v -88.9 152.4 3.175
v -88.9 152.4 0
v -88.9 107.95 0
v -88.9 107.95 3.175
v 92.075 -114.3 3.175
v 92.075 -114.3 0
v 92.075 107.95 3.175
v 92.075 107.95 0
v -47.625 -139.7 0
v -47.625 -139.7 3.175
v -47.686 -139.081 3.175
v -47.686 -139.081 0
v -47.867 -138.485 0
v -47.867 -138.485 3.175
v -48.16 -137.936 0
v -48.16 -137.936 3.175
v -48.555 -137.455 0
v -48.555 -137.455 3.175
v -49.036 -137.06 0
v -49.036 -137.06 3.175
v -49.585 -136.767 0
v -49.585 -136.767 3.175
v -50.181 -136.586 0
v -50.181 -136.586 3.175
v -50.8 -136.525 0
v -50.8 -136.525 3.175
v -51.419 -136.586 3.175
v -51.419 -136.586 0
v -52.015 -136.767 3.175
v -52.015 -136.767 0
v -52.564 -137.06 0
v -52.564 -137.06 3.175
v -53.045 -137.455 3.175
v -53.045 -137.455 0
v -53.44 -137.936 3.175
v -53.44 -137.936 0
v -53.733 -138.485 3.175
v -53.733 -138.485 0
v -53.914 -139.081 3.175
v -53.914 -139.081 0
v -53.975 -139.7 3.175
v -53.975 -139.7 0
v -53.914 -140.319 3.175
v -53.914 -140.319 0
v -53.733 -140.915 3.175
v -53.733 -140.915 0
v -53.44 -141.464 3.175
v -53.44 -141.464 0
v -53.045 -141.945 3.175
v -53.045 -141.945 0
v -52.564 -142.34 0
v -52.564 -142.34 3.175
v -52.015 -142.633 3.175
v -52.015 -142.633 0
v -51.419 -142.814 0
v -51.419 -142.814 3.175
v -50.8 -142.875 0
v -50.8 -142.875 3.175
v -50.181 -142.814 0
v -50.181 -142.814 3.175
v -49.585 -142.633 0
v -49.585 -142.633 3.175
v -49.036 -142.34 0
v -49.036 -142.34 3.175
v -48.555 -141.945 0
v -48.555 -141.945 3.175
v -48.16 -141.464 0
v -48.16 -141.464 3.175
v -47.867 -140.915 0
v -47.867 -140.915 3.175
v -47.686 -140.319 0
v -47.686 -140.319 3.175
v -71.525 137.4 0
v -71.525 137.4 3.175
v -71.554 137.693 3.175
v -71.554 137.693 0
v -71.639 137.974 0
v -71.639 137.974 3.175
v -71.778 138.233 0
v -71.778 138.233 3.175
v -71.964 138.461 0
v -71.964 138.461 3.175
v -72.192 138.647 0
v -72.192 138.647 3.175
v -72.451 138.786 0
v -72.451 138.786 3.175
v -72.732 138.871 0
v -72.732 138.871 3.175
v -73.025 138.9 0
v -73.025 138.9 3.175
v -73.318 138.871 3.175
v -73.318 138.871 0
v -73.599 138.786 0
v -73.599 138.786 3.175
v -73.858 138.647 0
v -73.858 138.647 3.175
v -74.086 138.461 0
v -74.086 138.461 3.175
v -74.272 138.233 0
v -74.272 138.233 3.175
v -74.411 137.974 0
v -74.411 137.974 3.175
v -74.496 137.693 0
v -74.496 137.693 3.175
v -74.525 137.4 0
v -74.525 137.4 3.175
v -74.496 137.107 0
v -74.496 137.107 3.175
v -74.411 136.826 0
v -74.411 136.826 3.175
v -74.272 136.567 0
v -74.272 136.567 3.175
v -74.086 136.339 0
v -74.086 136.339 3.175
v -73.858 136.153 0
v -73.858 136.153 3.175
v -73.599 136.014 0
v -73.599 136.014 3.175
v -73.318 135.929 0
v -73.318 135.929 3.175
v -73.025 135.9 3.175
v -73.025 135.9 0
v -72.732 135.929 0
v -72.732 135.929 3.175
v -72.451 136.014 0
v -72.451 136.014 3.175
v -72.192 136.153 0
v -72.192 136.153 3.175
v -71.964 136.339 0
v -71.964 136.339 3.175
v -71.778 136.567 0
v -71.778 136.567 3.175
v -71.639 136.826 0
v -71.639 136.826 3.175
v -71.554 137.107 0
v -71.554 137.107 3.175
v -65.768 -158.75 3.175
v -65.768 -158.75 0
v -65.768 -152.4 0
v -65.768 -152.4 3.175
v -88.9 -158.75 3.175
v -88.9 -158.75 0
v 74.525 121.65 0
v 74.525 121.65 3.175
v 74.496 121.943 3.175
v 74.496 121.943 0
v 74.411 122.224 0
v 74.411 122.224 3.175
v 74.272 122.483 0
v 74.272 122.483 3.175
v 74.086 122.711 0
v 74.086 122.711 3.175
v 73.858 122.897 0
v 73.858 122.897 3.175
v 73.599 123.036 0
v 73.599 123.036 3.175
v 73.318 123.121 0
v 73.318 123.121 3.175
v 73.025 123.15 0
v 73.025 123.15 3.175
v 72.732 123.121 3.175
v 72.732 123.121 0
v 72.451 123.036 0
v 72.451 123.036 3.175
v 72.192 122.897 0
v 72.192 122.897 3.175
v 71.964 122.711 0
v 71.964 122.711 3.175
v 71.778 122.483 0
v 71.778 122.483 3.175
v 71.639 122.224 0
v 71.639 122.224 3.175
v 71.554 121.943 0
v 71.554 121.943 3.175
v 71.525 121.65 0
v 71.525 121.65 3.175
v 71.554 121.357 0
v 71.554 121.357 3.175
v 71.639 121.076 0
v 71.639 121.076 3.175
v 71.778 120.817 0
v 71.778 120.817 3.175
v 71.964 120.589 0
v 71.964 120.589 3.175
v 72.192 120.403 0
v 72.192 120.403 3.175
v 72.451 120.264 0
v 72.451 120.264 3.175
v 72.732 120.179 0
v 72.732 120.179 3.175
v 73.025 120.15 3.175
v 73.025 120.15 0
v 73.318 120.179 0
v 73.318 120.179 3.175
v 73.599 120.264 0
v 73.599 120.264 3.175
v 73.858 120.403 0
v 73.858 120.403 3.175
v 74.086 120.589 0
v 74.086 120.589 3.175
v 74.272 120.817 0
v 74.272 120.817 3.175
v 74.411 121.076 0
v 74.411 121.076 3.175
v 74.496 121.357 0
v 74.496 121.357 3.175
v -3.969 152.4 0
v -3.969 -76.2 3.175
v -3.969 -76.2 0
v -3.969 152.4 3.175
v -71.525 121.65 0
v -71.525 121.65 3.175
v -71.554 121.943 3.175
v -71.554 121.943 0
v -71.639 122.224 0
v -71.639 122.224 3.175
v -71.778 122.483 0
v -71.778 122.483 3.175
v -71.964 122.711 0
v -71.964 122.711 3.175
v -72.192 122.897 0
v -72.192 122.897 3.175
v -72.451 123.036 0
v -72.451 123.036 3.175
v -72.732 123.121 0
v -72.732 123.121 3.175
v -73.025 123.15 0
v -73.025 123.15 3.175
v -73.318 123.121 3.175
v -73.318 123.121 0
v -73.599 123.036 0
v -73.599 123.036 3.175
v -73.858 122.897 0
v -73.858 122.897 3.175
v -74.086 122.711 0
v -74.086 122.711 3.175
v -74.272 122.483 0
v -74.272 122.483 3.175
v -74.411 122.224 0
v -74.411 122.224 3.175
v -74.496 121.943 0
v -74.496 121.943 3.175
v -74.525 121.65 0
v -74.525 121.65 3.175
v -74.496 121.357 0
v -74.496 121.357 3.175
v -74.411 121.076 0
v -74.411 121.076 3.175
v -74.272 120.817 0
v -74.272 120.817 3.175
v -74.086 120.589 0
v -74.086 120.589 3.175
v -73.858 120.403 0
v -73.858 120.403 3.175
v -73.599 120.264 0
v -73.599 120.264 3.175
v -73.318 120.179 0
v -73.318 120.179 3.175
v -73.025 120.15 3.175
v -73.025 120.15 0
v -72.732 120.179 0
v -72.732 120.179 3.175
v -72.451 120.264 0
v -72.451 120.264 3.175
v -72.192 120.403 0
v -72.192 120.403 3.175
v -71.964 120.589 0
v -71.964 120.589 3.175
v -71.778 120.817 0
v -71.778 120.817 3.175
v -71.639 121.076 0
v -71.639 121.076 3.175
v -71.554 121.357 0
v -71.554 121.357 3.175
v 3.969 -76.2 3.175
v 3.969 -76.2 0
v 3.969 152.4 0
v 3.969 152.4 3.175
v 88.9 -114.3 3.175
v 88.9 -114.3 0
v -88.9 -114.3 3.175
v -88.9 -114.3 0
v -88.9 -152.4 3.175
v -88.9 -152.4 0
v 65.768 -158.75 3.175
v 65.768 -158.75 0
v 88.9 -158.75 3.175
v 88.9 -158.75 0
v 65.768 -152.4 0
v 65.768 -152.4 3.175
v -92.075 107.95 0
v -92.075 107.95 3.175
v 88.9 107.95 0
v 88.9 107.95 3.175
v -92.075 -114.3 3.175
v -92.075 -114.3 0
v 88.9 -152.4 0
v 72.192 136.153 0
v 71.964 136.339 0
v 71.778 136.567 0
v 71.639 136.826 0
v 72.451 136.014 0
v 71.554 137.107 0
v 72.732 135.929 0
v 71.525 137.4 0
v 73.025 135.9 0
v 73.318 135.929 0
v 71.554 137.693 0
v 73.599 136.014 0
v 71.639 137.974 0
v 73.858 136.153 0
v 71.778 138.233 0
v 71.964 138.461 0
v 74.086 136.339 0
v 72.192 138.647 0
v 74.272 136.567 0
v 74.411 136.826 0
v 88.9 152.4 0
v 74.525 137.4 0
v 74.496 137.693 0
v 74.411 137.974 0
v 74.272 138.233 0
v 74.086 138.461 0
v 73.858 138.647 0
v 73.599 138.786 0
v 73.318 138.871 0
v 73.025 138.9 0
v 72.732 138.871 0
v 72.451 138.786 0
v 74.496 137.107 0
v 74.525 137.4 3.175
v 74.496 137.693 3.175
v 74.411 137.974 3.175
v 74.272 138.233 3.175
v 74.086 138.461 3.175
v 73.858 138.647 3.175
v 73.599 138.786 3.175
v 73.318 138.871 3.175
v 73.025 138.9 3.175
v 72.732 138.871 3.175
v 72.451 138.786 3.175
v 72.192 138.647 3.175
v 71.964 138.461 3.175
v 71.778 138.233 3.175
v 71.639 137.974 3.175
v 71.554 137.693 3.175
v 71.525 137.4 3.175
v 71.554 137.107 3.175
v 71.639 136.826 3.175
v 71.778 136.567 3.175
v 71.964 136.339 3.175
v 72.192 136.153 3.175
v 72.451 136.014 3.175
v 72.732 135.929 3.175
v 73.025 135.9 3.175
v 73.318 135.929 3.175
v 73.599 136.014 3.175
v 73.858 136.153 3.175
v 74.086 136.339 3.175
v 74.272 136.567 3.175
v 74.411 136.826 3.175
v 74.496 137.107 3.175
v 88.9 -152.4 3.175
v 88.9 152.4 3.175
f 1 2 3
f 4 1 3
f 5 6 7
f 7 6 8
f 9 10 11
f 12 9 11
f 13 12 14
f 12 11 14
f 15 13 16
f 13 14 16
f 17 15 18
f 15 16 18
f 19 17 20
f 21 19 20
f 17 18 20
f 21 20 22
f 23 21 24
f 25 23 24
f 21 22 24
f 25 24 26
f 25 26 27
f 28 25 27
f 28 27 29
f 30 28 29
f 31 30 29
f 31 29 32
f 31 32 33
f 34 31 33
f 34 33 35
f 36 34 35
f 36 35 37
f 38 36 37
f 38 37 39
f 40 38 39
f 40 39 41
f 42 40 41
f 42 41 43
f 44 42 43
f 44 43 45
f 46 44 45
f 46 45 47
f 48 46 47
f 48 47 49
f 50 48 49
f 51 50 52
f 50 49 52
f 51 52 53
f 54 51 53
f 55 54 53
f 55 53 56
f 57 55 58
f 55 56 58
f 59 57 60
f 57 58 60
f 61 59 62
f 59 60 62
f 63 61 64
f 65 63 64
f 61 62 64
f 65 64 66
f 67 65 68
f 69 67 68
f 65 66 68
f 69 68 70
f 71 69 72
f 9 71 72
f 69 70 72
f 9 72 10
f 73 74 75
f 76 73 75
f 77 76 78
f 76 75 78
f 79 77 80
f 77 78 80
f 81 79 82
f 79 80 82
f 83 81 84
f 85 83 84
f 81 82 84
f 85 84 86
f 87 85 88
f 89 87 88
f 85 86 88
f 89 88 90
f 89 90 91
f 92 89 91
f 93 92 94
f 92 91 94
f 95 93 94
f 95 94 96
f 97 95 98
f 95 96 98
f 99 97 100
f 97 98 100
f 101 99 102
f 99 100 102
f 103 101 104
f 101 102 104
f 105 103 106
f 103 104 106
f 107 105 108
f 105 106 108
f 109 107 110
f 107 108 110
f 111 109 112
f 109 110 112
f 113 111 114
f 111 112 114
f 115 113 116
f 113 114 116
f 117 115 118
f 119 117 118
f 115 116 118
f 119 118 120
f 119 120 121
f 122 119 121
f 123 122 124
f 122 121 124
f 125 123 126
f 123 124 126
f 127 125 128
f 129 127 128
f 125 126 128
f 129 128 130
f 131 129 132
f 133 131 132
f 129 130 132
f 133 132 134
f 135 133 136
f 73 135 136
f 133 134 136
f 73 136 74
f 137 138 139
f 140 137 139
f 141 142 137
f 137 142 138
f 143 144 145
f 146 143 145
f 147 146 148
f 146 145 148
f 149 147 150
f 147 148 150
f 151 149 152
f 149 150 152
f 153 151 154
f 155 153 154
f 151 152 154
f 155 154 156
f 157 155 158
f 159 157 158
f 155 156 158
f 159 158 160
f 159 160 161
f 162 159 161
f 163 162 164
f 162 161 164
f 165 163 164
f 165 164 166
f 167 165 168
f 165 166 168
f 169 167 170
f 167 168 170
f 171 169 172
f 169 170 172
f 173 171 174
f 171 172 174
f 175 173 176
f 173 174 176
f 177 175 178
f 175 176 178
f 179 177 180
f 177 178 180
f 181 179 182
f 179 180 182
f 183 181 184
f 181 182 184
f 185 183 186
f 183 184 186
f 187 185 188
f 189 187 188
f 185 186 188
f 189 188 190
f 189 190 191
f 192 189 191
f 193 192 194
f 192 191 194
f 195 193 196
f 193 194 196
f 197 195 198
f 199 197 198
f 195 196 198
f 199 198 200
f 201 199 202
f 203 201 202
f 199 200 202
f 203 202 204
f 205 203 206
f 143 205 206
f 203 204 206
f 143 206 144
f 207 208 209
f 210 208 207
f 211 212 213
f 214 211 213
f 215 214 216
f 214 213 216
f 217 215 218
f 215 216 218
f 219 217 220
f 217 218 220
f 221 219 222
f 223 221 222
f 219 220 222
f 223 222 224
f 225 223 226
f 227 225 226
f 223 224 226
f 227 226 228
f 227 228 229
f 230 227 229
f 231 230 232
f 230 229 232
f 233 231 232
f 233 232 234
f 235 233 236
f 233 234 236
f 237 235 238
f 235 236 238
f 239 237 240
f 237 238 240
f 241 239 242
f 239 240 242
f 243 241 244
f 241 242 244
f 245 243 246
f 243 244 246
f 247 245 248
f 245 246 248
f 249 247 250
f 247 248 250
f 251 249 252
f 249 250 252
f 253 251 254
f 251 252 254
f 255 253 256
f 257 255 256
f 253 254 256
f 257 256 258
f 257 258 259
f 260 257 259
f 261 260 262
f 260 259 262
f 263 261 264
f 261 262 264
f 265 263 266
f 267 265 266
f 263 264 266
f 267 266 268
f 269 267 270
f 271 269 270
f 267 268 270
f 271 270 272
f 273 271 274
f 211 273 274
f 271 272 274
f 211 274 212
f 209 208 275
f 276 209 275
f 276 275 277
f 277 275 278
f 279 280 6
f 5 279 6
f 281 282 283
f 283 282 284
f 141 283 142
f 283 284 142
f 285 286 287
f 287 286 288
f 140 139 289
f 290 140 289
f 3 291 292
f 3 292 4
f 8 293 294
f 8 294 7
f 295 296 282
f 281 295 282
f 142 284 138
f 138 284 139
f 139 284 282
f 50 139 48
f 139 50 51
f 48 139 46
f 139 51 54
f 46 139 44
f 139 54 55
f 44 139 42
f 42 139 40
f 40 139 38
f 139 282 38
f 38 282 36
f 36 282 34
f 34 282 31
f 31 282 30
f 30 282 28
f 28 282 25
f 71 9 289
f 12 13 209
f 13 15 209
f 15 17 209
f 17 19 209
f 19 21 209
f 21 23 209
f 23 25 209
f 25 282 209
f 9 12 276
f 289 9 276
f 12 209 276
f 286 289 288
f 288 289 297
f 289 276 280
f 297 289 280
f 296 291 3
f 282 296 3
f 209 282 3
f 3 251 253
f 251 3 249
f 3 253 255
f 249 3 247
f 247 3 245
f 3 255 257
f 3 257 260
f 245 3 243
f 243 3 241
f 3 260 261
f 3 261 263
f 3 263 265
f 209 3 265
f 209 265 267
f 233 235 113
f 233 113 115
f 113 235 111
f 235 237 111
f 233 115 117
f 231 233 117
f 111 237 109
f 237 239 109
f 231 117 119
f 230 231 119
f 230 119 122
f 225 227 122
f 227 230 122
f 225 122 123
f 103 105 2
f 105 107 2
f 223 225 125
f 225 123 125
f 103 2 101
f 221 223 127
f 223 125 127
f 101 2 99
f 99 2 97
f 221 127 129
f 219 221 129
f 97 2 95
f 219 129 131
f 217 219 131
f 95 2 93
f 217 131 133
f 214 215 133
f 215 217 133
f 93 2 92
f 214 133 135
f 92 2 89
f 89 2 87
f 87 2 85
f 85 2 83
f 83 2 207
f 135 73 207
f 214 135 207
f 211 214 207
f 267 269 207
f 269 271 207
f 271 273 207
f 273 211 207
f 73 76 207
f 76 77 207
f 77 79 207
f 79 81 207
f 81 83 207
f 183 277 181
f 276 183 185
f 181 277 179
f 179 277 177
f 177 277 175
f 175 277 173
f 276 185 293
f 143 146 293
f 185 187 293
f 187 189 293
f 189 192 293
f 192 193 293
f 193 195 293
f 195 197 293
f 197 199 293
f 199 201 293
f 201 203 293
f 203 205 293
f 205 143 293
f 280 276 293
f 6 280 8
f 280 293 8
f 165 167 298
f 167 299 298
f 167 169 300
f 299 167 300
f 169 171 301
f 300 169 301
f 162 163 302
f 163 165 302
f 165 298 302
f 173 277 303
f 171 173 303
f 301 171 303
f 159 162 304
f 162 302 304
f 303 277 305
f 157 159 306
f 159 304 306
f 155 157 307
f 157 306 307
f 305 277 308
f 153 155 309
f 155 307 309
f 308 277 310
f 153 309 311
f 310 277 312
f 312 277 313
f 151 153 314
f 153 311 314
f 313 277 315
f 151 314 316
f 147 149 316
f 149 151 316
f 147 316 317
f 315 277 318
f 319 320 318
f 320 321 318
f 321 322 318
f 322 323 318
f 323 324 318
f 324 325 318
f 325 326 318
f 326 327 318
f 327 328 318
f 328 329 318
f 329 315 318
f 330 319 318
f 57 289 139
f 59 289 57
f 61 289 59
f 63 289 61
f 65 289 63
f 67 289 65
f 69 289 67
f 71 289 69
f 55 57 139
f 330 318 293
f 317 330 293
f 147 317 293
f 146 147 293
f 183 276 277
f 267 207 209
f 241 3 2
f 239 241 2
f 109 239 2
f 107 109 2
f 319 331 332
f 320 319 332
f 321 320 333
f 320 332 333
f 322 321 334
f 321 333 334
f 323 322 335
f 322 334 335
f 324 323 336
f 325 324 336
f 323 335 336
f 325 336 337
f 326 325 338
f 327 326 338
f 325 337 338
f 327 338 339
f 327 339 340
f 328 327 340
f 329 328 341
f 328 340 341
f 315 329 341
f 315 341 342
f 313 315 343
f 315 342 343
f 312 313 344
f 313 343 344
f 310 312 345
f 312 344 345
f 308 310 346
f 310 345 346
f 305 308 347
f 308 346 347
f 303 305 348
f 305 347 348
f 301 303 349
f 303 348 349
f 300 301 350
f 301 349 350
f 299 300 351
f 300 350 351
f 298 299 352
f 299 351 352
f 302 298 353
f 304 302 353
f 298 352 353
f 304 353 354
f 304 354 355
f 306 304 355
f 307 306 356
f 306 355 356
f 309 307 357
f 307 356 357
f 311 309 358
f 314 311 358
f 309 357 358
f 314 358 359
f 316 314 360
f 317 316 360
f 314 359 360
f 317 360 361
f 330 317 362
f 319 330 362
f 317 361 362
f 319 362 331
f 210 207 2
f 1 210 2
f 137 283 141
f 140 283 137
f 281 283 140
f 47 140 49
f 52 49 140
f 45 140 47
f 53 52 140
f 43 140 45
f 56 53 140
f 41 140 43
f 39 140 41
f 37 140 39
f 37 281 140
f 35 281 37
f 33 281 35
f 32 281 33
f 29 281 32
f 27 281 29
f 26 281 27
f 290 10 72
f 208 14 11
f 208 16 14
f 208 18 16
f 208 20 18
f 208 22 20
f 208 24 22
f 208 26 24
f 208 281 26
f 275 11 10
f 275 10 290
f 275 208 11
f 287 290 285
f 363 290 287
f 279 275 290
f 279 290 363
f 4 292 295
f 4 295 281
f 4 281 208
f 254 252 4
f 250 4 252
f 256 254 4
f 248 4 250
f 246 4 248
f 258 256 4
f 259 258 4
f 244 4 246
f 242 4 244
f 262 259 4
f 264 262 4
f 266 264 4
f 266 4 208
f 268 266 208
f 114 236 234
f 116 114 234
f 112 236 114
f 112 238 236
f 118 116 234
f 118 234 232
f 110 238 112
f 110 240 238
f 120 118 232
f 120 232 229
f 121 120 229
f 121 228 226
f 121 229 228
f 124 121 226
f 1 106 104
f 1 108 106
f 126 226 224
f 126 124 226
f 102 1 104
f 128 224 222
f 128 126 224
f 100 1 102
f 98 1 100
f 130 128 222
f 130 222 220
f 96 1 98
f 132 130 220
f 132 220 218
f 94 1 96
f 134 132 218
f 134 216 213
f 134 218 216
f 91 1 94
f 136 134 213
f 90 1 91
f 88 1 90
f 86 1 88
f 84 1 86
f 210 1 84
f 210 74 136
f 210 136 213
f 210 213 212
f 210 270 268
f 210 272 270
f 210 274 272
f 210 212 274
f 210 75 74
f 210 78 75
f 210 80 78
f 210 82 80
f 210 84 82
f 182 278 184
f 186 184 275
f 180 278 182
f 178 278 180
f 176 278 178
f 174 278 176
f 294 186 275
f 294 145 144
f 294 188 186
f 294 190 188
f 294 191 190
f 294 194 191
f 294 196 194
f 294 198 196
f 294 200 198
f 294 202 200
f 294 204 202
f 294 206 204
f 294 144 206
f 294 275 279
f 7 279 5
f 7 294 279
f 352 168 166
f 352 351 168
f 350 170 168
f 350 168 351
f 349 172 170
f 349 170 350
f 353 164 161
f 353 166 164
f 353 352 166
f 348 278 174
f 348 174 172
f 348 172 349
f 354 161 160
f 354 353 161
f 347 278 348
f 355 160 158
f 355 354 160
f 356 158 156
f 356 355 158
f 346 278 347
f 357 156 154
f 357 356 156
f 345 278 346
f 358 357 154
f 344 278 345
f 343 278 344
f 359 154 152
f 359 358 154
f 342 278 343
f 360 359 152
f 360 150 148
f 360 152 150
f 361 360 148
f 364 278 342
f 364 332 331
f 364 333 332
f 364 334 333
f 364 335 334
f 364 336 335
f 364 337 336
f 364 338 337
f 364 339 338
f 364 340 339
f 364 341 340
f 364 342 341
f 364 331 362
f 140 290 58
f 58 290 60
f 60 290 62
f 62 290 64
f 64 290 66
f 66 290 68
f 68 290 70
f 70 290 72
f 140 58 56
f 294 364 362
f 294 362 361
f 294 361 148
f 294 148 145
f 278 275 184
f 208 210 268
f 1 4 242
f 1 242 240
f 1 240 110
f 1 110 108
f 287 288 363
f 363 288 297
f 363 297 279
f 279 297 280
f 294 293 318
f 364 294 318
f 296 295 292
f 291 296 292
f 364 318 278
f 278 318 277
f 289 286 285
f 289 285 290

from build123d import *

# Parameters (mm, degrees)
SKETCH2_W           = 3.175
SKETCH2_H           = 44.45
SKETCH2_W_2         = 23.132142857
SKETCH2_H_2         = 6.35
SKETCH2_W_3         = 26.307142857
BOSS_EXTRUDE1_DEPTH = 3.175
SKETCH3_W           = 7.9375
SKETCH3_H           = 228.6
CUT_EXTRUDE1_DEPTH  = 184.546857096
SKETCH4_R           = 3.175
CUT_EXTRUDE2_DEPTH  = 184.546857096
SKETCH5_R           = 1.5
CUT_EXTRUDE3_DEPTH  = 3.175
SKETCH6_W           = 3.175
SKETCH6_H           = 44.45
BOSS_EXTRUDE2_DEPTH = 3.175
SKETCH7_W           = 26.307142857
SKETCH7_H           = 6.35
CUT_EXTRUDE4_DEPTH  = 3.175


with BuildPart() as part:
    # Sketch2 → Boss-Extrude1 (new body)
    with BuildSketch(Plane.XY):
        Polygon((0, -152.4), (0, 152.4), (-88.9, 152.4), (-88.9, 107.95), (-88.9, 63.5), (-88.9, 19.05), (-88.9, -25.4), (-88.9, -69.85), (-88.9, -114.3), (-88.9, -152.4), (-65.767857143, -152.4), (-39.460714286, -152.4), (-13.153571429, -152.4), align=None)
        Polygon((88.9, 152.4), (0, 152.4), (0, -152.4), (13.153571429, -152.4), (39.460714286, -152.4), (65.767857143, -152.4), (88.9, -152.4), (88.9, -114.3), (88.9, -69.85), (88.9, -25.4), (88.9, 19.05), (88.9, 63.5), (88.9, 107.95), align=None)
        with Locations((-90.4875, 85.725)):
            Rectangle(SKETCH2_W, SKETCH2_H)
        with Locations((-90.4875, -3.175)):
            Rectangle(SKETCH2_W, SKETCH2_H)
        with Locations((-90.4875, -92.075)):
            Rectangle(SKETCH2_W, SKETCH2_H)
        with Locations((-77.333928571, -155.575)):
            Rectangle(SKETCH2_W_2, SKETCH2_H_2)
        with Locations((-26.307142858, -155.575)):
            Rectangle(SKETCH2_W_3, SKETCH2_H_2)
        with Locations((26.307142858, -155.575)):
            Rectangle(SKETCH2_W_3, SKETCH2_H_2)
        with Locations((90.4875, -92.075)):
            Rectangle(SKETCH2_W, SKETCH2_H)
        with Locations((90.4875, -3.175)):
            Rectangle(SKETCH2_W, SKETCH2_H)
        with Locations((90.4875, 85.725)):
            Rectangle(SKETCH2_W, SKETCH2_H)
        with Locations((77.333928571, -155.575)):
            Rectangle(SKETCH2_W_2, SKETCH2_H_2)
    extrude(amount=BOSS_EXTRUDE1_DEPTH)

    # Sketch3 → Cut-Extrude1 (cut, through all)
    with BuildSketch(Plane.XY.offset(3.175)):
        with Locations((0, 38.1)):
            Rectangle(SKETCH3_W, SKETCH3_H)
    extrude(amount=-CUT_EXTRUDE1_DEPTH, mode=Mode.SUBTRACT)

    # Sketch4 → Cut-Extrude2 (cut, through all)
    with BuildSketch(Plane.XY.offset(3.175)):
        with Locations((-50.8, -139.7)):
            Circle(SKETCH4_R)
    extrude(amount=-CUT_EXTRUDE2_DEPTH, mode=Mode.SUBTRACT)

    # Sketch5 → Cut-Extrude3 (cut)
    with BuildSketch(Plane.XY.offset(3.175)):
        with Locations((-73.025, 137.4)):
            Circle(SKETCH5_R)
        with Locations((-73.025, 121.65)):
            Circle(SKETCH5_R)
        with Locations((73.025, 121.65)):
            Circle(SKETCH5_R)
        with Locations((73.025, 137.4)):
            Circle(SKETCH5_R)
    extrude(amount=-CUT_EXTRUDE3_DEPTH, mode=Mode.SUBTRACT)

    # Sketch6 → Boss-Extrude2 (add)
    with BuildSketch(Plane.XY.offset(3.175)):
        with Locations((-90.4875, 41.275)):
            Rectangle(SKETCH6_W, SKETCH6_H)
        with Locations((-90.4875, -47.625)):
            Rectangle(SKETCH6_W, SKETCH6_H)
        with Locations((90.4875, 41.275)):
            Rectangle(SKETCH6_W, SKETCH6_H)
        with Locations((90.4875, -47.625)):
            Rectangle(SKETCH6_W, SKETCH6_H)
    extrude(amount=-BOSS_EXTRUDE2_DEPTH)

    # Sketch7 → Cut-Extrude4 (cut)
    with BuildSketch(Plane.XY.offset(3.175)):
        with Locations((-26.307142858, -155.575)):
            Rectangle(SKETCH7_W, SKETCH7_H)
        with Locations((26.307142858, -155.575)):
            Rectangle(SKETCH7_W, SKETCH7_H)
    extrude(amount=-CUT_EXTRUDE4_DEPTH, mode=Mode.SUBTRACT)


solid = part.part
